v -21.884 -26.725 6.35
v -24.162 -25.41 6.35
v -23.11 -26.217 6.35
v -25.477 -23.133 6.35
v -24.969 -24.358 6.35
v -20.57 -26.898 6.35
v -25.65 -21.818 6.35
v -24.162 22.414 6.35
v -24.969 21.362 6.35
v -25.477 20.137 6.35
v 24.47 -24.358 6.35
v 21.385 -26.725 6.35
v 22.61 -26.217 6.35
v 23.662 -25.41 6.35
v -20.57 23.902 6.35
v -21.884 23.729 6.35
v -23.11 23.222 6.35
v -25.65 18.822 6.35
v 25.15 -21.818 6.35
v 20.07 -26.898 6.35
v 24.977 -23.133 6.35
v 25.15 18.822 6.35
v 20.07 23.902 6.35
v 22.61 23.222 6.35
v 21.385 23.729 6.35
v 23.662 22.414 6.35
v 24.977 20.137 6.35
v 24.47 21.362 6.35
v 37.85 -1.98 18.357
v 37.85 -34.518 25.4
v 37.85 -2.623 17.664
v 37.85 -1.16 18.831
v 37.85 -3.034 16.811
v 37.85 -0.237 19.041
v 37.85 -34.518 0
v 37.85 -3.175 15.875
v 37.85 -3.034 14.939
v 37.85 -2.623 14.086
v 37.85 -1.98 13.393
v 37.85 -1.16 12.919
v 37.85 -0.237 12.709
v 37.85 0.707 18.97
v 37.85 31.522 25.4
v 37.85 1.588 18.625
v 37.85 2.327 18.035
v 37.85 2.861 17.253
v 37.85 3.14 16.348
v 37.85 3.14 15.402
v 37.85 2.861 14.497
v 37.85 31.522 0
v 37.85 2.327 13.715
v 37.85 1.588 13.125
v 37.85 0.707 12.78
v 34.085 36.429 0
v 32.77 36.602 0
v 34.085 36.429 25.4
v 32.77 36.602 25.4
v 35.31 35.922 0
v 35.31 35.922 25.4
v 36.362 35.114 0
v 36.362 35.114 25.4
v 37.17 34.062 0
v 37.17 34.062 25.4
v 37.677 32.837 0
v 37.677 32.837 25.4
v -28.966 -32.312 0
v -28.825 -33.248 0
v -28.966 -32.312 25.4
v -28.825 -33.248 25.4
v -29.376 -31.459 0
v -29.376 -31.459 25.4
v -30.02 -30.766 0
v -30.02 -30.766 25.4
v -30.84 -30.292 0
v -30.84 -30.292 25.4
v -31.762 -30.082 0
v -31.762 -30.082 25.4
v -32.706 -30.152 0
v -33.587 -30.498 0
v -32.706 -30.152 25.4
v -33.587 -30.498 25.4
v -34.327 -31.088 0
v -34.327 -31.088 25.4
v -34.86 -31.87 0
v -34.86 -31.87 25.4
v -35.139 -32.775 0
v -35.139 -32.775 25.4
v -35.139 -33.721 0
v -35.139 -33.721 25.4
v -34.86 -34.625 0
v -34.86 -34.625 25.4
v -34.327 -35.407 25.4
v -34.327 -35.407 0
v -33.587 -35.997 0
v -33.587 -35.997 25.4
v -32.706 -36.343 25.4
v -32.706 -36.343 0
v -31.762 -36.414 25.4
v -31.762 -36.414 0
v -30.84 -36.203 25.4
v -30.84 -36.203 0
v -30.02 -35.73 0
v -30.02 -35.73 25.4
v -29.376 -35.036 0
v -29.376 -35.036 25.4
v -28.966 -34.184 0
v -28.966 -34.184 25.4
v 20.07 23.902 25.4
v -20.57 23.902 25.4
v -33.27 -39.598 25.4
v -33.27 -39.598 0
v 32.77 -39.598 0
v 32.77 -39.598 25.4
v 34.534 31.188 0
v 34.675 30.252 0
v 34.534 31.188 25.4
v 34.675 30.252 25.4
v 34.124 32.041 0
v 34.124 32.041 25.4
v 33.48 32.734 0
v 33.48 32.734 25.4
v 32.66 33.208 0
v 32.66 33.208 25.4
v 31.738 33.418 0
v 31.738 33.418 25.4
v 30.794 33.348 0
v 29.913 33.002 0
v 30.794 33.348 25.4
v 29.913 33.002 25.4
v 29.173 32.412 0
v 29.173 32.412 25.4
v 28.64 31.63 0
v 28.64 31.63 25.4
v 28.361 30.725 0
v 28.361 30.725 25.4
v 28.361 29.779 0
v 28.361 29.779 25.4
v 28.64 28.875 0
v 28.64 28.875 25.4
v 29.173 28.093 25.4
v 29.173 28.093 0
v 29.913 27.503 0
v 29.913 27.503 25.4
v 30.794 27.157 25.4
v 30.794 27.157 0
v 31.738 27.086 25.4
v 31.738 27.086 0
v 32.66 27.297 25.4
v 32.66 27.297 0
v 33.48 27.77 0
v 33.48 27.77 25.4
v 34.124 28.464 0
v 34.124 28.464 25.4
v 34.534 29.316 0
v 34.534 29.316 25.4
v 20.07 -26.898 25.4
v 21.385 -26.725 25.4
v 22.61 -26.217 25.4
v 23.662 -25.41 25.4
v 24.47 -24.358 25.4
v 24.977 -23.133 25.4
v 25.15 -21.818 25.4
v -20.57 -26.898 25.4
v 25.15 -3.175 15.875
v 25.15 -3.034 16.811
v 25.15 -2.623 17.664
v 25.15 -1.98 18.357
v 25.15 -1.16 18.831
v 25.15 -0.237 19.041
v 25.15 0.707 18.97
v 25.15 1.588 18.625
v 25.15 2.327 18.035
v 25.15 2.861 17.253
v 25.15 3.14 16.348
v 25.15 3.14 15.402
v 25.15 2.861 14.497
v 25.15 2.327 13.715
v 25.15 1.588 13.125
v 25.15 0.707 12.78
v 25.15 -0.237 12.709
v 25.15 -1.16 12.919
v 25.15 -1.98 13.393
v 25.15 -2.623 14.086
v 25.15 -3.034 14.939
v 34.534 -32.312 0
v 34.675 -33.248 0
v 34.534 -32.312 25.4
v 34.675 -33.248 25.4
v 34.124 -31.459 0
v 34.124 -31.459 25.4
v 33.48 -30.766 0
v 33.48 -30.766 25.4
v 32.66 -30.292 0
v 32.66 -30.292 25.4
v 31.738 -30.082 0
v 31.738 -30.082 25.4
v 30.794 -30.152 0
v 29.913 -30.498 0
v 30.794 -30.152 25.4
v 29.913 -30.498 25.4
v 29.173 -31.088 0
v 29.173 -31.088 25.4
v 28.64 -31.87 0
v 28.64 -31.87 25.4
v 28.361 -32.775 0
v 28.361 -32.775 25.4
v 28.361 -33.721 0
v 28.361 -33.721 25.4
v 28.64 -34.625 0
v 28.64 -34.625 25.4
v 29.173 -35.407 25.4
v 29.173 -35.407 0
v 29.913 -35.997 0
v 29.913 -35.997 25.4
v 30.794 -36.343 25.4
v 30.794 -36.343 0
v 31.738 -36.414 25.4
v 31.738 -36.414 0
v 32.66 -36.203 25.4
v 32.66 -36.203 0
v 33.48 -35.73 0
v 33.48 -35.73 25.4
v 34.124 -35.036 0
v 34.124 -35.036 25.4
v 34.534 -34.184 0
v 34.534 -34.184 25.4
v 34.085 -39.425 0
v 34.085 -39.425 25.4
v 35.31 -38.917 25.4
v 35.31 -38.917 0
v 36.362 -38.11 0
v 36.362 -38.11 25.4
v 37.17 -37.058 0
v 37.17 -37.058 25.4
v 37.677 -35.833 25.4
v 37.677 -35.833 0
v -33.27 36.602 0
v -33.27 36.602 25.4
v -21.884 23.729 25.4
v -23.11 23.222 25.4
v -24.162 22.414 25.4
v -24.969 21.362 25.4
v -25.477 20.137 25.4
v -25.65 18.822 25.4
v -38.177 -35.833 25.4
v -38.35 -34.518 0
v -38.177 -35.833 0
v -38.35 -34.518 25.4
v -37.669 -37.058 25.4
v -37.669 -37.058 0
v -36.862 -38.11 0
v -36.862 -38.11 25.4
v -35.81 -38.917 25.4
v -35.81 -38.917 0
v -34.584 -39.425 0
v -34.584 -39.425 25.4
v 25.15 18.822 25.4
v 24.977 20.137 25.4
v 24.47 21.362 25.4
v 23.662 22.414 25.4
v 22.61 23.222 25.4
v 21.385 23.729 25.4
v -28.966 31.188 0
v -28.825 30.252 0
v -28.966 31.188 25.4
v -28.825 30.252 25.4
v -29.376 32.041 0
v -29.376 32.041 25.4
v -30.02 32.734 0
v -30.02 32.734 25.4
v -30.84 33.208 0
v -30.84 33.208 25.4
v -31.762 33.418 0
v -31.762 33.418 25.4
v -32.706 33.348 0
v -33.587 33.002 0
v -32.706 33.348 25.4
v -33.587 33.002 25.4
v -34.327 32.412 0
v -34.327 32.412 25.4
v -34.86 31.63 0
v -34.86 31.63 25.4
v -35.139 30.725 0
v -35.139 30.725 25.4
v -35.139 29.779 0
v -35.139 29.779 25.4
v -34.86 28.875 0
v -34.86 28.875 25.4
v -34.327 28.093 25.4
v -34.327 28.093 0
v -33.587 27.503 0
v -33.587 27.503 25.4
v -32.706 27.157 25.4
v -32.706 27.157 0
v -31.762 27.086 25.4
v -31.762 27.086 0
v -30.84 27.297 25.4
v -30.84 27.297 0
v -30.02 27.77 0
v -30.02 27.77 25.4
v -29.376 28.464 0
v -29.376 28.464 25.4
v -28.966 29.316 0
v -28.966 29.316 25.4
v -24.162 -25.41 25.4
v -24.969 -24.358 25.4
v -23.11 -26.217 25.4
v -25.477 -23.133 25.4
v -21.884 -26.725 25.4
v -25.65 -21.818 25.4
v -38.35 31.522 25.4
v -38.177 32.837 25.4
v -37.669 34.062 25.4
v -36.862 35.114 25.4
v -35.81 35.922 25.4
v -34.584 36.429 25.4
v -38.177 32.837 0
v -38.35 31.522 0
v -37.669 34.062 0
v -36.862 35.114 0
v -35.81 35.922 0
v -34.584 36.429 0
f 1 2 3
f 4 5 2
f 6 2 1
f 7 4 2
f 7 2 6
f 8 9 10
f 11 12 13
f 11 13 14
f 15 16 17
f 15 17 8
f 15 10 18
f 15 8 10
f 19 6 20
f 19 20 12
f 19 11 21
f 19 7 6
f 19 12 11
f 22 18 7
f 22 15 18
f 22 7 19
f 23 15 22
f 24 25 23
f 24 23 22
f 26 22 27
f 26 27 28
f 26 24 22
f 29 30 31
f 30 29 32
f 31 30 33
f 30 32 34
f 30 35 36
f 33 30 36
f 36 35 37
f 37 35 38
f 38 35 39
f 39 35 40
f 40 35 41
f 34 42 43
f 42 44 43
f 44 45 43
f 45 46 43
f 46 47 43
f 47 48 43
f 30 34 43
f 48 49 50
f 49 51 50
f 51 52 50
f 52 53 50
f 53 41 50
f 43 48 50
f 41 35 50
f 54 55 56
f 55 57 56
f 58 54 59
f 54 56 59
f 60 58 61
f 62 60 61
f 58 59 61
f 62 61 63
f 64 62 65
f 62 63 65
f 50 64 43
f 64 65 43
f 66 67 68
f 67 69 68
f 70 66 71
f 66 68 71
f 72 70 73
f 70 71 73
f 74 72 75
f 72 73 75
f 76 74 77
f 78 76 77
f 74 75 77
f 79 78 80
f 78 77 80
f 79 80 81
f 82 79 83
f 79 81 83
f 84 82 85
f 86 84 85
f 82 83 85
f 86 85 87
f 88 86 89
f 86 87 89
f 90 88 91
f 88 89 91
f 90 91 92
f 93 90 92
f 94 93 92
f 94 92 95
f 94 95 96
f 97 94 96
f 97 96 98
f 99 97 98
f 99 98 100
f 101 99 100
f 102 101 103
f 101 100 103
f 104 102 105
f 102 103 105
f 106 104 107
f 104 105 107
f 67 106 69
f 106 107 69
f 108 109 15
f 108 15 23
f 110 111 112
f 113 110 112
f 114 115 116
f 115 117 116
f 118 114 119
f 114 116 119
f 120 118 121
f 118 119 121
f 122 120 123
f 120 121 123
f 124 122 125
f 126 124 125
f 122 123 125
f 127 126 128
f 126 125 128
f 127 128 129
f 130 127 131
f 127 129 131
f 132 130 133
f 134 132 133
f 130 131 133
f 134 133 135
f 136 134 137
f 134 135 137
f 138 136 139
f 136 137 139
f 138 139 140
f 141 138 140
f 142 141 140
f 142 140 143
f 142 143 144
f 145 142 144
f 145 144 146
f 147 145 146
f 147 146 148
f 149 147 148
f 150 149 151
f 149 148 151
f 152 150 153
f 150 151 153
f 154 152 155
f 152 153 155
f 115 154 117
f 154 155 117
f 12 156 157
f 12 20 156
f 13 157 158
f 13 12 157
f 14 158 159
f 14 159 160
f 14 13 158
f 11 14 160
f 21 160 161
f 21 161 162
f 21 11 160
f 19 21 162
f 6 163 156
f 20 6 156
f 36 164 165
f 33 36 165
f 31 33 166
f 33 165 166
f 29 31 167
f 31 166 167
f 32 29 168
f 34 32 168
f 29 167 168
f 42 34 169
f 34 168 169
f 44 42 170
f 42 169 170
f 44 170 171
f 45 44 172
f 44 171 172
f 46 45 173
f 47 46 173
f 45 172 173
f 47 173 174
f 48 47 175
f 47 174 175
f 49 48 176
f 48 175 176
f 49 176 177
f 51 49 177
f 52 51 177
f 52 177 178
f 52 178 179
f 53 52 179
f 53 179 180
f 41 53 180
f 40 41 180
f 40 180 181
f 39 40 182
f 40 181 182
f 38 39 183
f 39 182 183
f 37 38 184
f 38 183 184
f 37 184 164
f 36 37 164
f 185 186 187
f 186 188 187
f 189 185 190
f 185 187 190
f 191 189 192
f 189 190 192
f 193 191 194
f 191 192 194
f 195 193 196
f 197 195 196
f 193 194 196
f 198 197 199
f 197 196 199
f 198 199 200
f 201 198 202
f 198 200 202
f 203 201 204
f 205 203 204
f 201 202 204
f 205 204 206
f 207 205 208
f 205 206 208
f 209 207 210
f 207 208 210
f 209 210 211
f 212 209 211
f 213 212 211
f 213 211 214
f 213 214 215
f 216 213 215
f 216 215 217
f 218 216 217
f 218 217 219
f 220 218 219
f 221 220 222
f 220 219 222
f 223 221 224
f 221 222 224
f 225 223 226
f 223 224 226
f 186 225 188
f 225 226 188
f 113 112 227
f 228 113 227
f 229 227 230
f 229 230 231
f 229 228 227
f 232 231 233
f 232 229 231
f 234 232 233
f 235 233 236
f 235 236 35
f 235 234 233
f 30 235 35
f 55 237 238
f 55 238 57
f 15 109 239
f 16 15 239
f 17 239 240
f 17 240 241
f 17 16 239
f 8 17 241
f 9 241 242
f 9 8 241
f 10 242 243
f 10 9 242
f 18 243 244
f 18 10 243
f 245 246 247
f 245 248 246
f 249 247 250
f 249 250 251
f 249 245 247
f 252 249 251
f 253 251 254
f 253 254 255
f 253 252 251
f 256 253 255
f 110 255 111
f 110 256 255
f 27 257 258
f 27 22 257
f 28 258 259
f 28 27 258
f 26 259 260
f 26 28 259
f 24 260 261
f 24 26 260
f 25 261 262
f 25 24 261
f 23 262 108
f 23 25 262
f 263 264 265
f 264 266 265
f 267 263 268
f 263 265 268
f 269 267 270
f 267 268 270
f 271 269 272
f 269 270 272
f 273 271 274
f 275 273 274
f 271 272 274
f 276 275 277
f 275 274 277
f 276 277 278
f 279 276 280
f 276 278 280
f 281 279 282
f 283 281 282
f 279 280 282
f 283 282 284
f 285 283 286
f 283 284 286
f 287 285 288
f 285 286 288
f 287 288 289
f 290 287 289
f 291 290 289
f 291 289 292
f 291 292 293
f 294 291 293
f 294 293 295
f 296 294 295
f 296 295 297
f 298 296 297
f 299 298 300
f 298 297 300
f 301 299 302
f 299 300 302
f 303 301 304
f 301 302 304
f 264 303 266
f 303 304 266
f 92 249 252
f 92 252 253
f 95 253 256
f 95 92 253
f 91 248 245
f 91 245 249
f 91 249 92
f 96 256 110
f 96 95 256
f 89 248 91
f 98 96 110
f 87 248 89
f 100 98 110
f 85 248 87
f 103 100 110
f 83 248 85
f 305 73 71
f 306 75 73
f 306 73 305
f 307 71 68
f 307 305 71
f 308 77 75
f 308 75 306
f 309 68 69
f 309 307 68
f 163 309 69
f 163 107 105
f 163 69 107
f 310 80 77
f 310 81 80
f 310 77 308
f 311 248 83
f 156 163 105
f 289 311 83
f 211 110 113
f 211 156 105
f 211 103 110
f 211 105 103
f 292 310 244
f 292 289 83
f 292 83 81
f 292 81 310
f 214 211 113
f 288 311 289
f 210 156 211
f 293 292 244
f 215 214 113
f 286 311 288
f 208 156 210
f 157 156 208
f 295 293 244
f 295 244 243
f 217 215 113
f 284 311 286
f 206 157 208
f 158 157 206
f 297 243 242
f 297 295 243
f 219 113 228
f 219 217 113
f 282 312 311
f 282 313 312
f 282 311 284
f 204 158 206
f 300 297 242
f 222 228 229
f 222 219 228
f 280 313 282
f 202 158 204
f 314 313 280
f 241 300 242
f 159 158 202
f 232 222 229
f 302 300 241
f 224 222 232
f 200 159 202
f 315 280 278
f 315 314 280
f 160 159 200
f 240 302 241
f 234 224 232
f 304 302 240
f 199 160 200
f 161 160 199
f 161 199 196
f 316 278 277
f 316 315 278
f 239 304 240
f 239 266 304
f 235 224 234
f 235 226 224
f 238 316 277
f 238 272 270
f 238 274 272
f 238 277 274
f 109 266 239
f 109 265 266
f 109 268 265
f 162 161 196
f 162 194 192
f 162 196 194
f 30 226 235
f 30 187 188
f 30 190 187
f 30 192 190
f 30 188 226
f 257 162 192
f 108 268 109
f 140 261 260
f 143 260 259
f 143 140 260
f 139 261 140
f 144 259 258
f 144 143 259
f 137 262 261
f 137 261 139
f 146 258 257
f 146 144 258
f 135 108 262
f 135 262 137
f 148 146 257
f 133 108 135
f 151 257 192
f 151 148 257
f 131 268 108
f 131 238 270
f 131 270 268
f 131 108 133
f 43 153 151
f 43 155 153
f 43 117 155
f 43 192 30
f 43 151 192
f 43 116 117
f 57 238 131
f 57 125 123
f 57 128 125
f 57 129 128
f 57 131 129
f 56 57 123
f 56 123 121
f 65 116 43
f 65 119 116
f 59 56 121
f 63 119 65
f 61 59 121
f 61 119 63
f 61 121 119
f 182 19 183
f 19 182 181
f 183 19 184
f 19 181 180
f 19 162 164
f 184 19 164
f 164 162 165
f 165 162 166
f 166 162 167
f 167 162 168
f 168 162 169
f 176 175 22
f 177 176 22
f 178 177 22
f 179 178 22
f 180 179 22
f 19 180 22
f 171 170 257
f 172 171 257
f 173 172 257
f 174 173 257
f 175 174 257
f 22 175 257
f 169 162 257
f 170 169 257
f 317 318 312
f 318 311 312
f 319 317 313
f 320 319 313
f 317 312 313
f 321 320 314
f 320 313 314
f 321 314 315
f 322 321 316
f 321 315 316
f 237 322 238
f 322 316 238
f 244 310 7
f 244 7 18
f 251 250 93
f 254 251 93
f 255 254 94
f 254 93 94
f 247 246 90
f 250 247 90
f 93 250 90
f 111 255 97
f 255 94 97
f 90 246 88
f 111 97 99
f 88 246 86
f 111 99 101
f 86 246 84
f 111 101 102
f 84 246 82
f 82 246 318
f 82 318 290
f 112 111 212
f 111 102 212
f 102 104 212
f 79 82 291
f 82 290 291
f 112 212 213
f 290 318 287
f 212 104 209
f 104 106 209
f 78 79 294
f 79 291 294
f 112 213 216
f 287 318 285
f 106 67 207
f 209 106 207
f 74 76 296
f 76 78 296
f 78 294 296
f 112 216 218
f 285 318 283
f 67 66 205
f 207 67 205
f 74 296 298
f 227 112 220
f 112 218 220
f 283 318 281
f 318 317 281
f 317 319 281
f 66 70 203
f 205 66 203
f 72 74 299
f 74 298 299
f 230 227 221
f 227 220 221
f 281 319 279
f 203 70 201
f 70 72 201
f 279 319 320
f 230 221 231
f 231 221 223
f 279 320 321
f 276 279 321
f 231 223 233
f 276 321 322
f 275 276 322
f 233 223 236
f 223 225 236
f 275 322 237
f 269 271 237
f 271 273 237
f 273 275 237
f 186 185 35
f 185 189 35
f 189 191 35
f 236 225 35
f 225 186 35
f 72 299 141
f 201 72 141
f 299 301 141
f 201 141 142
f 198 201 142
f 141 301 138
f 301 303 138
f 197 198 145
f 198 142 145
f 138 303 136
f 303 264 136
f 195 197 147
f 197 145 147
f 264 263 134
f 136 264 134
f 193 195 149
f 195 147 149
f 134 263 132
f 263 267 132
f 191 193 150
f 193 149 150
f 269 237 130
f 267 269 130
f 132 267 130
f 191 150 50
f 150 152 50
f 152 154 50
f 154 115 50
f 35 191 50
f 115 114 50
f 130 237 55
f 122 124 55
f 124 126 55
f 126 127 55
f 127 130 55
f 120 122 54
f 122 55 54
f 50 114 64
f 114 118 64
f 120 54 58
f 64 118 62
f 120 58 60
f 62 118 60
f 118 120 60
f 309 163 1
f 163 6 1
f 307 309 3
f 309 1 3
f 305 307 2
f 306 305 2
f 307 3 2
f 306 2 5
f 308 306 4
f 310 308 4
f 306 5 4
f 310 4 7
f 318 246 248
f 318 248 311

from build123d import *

# Parameters (mm, degrees)
F0_W     = 76.2
F0_H     = 76.2
F1_DEPTH = 25.4
F2_W     = 50.8
F2_H     = 50.8
F2_R     = 3.175
F3_DEPTH = 19.05
F4_R     = 5.08
F5_R     = 3.175
F6_DEPTH = 12.7
F7_DEPTH = 6.35


with BuildPart() as f1:
    # F0 (on Top) → F1 (new body)
    with BuildSketch(Plane.XY):
        with Locations((-0.2496400848, -1.4978470281)):
            Rectangle(F0_W, F0_H)
    extrude(amount=F1_DEPTH)

    # F2 (on face) → F3 (cut)
    with BuildSketch(Plane.XY.offset(25.4)):
        with Locations((-0.2496400848, -1.4978470281)):
            Rectangle(F2_W, F2_H)
        with Locations((-31.9996400848, -33.2478470281)):
            Circle(F2_R)
        with Locations((31.5003599152, -33.2478470281)):
            Circle(F2_R)
        with Locations((31.5003599152, 30.2521529719)):
            Circle(F2_R)
        with Locations((-31.9996400848, 30.2521529719)):
            Circle(F2_R)
    extrude(amount=-F3_DEPTH, mode=Mode.SUBTRACT)

    # F4
    f4_edges = [f1.edges().sort_by_distance(p)[0] for p in [
        (-38.34964, 36.602153, 12.7),
        (37.85036, 36.602153, 12.7),
        (37.85036, -39.597847, 12.7),
        (-38.34964, -39.597847, 12.7),
        (25.15036, 23.902153, 15.875),
        (25.15036, -26.897847, 15.875),
        (-25.64964, -26.897847, 15.875),
        (-25.64964, 23.902153, 15.875),
    ]]
    fillet(f4_edges, radius=F4_R)

    # F5 (on face) → F6 (cut, through all)
    with BuildSketch(Plane(origin=(25.1503599152, 0, 0), x_dir=(0, -1, 0), z_dir=(-1, 0, 0))):
        with Locations((0, 15.875)):
            Circle(F5_R)
    extrude(amount=-F6_DEPTH, mode=Mode.SUBTRACT)

    # F7 (cut, through all): faces of the model
    f7_faces = [f1.faces().sort_by_distance(p)[0] for p in [
        (31.5003599152, 30.2521529719, 6.35),
        (31.5003599152, -33.2478470281, 6.35),
        (-31.9996400848, 30.2521529719, 6.35),
        (-31.9996400848, -33.2478470281, 6.35),
    ]]
    extrude(f7_faces, amount=-F7_DEPTH, mode=Mode.SUBTRACT)


solid = f1.part
